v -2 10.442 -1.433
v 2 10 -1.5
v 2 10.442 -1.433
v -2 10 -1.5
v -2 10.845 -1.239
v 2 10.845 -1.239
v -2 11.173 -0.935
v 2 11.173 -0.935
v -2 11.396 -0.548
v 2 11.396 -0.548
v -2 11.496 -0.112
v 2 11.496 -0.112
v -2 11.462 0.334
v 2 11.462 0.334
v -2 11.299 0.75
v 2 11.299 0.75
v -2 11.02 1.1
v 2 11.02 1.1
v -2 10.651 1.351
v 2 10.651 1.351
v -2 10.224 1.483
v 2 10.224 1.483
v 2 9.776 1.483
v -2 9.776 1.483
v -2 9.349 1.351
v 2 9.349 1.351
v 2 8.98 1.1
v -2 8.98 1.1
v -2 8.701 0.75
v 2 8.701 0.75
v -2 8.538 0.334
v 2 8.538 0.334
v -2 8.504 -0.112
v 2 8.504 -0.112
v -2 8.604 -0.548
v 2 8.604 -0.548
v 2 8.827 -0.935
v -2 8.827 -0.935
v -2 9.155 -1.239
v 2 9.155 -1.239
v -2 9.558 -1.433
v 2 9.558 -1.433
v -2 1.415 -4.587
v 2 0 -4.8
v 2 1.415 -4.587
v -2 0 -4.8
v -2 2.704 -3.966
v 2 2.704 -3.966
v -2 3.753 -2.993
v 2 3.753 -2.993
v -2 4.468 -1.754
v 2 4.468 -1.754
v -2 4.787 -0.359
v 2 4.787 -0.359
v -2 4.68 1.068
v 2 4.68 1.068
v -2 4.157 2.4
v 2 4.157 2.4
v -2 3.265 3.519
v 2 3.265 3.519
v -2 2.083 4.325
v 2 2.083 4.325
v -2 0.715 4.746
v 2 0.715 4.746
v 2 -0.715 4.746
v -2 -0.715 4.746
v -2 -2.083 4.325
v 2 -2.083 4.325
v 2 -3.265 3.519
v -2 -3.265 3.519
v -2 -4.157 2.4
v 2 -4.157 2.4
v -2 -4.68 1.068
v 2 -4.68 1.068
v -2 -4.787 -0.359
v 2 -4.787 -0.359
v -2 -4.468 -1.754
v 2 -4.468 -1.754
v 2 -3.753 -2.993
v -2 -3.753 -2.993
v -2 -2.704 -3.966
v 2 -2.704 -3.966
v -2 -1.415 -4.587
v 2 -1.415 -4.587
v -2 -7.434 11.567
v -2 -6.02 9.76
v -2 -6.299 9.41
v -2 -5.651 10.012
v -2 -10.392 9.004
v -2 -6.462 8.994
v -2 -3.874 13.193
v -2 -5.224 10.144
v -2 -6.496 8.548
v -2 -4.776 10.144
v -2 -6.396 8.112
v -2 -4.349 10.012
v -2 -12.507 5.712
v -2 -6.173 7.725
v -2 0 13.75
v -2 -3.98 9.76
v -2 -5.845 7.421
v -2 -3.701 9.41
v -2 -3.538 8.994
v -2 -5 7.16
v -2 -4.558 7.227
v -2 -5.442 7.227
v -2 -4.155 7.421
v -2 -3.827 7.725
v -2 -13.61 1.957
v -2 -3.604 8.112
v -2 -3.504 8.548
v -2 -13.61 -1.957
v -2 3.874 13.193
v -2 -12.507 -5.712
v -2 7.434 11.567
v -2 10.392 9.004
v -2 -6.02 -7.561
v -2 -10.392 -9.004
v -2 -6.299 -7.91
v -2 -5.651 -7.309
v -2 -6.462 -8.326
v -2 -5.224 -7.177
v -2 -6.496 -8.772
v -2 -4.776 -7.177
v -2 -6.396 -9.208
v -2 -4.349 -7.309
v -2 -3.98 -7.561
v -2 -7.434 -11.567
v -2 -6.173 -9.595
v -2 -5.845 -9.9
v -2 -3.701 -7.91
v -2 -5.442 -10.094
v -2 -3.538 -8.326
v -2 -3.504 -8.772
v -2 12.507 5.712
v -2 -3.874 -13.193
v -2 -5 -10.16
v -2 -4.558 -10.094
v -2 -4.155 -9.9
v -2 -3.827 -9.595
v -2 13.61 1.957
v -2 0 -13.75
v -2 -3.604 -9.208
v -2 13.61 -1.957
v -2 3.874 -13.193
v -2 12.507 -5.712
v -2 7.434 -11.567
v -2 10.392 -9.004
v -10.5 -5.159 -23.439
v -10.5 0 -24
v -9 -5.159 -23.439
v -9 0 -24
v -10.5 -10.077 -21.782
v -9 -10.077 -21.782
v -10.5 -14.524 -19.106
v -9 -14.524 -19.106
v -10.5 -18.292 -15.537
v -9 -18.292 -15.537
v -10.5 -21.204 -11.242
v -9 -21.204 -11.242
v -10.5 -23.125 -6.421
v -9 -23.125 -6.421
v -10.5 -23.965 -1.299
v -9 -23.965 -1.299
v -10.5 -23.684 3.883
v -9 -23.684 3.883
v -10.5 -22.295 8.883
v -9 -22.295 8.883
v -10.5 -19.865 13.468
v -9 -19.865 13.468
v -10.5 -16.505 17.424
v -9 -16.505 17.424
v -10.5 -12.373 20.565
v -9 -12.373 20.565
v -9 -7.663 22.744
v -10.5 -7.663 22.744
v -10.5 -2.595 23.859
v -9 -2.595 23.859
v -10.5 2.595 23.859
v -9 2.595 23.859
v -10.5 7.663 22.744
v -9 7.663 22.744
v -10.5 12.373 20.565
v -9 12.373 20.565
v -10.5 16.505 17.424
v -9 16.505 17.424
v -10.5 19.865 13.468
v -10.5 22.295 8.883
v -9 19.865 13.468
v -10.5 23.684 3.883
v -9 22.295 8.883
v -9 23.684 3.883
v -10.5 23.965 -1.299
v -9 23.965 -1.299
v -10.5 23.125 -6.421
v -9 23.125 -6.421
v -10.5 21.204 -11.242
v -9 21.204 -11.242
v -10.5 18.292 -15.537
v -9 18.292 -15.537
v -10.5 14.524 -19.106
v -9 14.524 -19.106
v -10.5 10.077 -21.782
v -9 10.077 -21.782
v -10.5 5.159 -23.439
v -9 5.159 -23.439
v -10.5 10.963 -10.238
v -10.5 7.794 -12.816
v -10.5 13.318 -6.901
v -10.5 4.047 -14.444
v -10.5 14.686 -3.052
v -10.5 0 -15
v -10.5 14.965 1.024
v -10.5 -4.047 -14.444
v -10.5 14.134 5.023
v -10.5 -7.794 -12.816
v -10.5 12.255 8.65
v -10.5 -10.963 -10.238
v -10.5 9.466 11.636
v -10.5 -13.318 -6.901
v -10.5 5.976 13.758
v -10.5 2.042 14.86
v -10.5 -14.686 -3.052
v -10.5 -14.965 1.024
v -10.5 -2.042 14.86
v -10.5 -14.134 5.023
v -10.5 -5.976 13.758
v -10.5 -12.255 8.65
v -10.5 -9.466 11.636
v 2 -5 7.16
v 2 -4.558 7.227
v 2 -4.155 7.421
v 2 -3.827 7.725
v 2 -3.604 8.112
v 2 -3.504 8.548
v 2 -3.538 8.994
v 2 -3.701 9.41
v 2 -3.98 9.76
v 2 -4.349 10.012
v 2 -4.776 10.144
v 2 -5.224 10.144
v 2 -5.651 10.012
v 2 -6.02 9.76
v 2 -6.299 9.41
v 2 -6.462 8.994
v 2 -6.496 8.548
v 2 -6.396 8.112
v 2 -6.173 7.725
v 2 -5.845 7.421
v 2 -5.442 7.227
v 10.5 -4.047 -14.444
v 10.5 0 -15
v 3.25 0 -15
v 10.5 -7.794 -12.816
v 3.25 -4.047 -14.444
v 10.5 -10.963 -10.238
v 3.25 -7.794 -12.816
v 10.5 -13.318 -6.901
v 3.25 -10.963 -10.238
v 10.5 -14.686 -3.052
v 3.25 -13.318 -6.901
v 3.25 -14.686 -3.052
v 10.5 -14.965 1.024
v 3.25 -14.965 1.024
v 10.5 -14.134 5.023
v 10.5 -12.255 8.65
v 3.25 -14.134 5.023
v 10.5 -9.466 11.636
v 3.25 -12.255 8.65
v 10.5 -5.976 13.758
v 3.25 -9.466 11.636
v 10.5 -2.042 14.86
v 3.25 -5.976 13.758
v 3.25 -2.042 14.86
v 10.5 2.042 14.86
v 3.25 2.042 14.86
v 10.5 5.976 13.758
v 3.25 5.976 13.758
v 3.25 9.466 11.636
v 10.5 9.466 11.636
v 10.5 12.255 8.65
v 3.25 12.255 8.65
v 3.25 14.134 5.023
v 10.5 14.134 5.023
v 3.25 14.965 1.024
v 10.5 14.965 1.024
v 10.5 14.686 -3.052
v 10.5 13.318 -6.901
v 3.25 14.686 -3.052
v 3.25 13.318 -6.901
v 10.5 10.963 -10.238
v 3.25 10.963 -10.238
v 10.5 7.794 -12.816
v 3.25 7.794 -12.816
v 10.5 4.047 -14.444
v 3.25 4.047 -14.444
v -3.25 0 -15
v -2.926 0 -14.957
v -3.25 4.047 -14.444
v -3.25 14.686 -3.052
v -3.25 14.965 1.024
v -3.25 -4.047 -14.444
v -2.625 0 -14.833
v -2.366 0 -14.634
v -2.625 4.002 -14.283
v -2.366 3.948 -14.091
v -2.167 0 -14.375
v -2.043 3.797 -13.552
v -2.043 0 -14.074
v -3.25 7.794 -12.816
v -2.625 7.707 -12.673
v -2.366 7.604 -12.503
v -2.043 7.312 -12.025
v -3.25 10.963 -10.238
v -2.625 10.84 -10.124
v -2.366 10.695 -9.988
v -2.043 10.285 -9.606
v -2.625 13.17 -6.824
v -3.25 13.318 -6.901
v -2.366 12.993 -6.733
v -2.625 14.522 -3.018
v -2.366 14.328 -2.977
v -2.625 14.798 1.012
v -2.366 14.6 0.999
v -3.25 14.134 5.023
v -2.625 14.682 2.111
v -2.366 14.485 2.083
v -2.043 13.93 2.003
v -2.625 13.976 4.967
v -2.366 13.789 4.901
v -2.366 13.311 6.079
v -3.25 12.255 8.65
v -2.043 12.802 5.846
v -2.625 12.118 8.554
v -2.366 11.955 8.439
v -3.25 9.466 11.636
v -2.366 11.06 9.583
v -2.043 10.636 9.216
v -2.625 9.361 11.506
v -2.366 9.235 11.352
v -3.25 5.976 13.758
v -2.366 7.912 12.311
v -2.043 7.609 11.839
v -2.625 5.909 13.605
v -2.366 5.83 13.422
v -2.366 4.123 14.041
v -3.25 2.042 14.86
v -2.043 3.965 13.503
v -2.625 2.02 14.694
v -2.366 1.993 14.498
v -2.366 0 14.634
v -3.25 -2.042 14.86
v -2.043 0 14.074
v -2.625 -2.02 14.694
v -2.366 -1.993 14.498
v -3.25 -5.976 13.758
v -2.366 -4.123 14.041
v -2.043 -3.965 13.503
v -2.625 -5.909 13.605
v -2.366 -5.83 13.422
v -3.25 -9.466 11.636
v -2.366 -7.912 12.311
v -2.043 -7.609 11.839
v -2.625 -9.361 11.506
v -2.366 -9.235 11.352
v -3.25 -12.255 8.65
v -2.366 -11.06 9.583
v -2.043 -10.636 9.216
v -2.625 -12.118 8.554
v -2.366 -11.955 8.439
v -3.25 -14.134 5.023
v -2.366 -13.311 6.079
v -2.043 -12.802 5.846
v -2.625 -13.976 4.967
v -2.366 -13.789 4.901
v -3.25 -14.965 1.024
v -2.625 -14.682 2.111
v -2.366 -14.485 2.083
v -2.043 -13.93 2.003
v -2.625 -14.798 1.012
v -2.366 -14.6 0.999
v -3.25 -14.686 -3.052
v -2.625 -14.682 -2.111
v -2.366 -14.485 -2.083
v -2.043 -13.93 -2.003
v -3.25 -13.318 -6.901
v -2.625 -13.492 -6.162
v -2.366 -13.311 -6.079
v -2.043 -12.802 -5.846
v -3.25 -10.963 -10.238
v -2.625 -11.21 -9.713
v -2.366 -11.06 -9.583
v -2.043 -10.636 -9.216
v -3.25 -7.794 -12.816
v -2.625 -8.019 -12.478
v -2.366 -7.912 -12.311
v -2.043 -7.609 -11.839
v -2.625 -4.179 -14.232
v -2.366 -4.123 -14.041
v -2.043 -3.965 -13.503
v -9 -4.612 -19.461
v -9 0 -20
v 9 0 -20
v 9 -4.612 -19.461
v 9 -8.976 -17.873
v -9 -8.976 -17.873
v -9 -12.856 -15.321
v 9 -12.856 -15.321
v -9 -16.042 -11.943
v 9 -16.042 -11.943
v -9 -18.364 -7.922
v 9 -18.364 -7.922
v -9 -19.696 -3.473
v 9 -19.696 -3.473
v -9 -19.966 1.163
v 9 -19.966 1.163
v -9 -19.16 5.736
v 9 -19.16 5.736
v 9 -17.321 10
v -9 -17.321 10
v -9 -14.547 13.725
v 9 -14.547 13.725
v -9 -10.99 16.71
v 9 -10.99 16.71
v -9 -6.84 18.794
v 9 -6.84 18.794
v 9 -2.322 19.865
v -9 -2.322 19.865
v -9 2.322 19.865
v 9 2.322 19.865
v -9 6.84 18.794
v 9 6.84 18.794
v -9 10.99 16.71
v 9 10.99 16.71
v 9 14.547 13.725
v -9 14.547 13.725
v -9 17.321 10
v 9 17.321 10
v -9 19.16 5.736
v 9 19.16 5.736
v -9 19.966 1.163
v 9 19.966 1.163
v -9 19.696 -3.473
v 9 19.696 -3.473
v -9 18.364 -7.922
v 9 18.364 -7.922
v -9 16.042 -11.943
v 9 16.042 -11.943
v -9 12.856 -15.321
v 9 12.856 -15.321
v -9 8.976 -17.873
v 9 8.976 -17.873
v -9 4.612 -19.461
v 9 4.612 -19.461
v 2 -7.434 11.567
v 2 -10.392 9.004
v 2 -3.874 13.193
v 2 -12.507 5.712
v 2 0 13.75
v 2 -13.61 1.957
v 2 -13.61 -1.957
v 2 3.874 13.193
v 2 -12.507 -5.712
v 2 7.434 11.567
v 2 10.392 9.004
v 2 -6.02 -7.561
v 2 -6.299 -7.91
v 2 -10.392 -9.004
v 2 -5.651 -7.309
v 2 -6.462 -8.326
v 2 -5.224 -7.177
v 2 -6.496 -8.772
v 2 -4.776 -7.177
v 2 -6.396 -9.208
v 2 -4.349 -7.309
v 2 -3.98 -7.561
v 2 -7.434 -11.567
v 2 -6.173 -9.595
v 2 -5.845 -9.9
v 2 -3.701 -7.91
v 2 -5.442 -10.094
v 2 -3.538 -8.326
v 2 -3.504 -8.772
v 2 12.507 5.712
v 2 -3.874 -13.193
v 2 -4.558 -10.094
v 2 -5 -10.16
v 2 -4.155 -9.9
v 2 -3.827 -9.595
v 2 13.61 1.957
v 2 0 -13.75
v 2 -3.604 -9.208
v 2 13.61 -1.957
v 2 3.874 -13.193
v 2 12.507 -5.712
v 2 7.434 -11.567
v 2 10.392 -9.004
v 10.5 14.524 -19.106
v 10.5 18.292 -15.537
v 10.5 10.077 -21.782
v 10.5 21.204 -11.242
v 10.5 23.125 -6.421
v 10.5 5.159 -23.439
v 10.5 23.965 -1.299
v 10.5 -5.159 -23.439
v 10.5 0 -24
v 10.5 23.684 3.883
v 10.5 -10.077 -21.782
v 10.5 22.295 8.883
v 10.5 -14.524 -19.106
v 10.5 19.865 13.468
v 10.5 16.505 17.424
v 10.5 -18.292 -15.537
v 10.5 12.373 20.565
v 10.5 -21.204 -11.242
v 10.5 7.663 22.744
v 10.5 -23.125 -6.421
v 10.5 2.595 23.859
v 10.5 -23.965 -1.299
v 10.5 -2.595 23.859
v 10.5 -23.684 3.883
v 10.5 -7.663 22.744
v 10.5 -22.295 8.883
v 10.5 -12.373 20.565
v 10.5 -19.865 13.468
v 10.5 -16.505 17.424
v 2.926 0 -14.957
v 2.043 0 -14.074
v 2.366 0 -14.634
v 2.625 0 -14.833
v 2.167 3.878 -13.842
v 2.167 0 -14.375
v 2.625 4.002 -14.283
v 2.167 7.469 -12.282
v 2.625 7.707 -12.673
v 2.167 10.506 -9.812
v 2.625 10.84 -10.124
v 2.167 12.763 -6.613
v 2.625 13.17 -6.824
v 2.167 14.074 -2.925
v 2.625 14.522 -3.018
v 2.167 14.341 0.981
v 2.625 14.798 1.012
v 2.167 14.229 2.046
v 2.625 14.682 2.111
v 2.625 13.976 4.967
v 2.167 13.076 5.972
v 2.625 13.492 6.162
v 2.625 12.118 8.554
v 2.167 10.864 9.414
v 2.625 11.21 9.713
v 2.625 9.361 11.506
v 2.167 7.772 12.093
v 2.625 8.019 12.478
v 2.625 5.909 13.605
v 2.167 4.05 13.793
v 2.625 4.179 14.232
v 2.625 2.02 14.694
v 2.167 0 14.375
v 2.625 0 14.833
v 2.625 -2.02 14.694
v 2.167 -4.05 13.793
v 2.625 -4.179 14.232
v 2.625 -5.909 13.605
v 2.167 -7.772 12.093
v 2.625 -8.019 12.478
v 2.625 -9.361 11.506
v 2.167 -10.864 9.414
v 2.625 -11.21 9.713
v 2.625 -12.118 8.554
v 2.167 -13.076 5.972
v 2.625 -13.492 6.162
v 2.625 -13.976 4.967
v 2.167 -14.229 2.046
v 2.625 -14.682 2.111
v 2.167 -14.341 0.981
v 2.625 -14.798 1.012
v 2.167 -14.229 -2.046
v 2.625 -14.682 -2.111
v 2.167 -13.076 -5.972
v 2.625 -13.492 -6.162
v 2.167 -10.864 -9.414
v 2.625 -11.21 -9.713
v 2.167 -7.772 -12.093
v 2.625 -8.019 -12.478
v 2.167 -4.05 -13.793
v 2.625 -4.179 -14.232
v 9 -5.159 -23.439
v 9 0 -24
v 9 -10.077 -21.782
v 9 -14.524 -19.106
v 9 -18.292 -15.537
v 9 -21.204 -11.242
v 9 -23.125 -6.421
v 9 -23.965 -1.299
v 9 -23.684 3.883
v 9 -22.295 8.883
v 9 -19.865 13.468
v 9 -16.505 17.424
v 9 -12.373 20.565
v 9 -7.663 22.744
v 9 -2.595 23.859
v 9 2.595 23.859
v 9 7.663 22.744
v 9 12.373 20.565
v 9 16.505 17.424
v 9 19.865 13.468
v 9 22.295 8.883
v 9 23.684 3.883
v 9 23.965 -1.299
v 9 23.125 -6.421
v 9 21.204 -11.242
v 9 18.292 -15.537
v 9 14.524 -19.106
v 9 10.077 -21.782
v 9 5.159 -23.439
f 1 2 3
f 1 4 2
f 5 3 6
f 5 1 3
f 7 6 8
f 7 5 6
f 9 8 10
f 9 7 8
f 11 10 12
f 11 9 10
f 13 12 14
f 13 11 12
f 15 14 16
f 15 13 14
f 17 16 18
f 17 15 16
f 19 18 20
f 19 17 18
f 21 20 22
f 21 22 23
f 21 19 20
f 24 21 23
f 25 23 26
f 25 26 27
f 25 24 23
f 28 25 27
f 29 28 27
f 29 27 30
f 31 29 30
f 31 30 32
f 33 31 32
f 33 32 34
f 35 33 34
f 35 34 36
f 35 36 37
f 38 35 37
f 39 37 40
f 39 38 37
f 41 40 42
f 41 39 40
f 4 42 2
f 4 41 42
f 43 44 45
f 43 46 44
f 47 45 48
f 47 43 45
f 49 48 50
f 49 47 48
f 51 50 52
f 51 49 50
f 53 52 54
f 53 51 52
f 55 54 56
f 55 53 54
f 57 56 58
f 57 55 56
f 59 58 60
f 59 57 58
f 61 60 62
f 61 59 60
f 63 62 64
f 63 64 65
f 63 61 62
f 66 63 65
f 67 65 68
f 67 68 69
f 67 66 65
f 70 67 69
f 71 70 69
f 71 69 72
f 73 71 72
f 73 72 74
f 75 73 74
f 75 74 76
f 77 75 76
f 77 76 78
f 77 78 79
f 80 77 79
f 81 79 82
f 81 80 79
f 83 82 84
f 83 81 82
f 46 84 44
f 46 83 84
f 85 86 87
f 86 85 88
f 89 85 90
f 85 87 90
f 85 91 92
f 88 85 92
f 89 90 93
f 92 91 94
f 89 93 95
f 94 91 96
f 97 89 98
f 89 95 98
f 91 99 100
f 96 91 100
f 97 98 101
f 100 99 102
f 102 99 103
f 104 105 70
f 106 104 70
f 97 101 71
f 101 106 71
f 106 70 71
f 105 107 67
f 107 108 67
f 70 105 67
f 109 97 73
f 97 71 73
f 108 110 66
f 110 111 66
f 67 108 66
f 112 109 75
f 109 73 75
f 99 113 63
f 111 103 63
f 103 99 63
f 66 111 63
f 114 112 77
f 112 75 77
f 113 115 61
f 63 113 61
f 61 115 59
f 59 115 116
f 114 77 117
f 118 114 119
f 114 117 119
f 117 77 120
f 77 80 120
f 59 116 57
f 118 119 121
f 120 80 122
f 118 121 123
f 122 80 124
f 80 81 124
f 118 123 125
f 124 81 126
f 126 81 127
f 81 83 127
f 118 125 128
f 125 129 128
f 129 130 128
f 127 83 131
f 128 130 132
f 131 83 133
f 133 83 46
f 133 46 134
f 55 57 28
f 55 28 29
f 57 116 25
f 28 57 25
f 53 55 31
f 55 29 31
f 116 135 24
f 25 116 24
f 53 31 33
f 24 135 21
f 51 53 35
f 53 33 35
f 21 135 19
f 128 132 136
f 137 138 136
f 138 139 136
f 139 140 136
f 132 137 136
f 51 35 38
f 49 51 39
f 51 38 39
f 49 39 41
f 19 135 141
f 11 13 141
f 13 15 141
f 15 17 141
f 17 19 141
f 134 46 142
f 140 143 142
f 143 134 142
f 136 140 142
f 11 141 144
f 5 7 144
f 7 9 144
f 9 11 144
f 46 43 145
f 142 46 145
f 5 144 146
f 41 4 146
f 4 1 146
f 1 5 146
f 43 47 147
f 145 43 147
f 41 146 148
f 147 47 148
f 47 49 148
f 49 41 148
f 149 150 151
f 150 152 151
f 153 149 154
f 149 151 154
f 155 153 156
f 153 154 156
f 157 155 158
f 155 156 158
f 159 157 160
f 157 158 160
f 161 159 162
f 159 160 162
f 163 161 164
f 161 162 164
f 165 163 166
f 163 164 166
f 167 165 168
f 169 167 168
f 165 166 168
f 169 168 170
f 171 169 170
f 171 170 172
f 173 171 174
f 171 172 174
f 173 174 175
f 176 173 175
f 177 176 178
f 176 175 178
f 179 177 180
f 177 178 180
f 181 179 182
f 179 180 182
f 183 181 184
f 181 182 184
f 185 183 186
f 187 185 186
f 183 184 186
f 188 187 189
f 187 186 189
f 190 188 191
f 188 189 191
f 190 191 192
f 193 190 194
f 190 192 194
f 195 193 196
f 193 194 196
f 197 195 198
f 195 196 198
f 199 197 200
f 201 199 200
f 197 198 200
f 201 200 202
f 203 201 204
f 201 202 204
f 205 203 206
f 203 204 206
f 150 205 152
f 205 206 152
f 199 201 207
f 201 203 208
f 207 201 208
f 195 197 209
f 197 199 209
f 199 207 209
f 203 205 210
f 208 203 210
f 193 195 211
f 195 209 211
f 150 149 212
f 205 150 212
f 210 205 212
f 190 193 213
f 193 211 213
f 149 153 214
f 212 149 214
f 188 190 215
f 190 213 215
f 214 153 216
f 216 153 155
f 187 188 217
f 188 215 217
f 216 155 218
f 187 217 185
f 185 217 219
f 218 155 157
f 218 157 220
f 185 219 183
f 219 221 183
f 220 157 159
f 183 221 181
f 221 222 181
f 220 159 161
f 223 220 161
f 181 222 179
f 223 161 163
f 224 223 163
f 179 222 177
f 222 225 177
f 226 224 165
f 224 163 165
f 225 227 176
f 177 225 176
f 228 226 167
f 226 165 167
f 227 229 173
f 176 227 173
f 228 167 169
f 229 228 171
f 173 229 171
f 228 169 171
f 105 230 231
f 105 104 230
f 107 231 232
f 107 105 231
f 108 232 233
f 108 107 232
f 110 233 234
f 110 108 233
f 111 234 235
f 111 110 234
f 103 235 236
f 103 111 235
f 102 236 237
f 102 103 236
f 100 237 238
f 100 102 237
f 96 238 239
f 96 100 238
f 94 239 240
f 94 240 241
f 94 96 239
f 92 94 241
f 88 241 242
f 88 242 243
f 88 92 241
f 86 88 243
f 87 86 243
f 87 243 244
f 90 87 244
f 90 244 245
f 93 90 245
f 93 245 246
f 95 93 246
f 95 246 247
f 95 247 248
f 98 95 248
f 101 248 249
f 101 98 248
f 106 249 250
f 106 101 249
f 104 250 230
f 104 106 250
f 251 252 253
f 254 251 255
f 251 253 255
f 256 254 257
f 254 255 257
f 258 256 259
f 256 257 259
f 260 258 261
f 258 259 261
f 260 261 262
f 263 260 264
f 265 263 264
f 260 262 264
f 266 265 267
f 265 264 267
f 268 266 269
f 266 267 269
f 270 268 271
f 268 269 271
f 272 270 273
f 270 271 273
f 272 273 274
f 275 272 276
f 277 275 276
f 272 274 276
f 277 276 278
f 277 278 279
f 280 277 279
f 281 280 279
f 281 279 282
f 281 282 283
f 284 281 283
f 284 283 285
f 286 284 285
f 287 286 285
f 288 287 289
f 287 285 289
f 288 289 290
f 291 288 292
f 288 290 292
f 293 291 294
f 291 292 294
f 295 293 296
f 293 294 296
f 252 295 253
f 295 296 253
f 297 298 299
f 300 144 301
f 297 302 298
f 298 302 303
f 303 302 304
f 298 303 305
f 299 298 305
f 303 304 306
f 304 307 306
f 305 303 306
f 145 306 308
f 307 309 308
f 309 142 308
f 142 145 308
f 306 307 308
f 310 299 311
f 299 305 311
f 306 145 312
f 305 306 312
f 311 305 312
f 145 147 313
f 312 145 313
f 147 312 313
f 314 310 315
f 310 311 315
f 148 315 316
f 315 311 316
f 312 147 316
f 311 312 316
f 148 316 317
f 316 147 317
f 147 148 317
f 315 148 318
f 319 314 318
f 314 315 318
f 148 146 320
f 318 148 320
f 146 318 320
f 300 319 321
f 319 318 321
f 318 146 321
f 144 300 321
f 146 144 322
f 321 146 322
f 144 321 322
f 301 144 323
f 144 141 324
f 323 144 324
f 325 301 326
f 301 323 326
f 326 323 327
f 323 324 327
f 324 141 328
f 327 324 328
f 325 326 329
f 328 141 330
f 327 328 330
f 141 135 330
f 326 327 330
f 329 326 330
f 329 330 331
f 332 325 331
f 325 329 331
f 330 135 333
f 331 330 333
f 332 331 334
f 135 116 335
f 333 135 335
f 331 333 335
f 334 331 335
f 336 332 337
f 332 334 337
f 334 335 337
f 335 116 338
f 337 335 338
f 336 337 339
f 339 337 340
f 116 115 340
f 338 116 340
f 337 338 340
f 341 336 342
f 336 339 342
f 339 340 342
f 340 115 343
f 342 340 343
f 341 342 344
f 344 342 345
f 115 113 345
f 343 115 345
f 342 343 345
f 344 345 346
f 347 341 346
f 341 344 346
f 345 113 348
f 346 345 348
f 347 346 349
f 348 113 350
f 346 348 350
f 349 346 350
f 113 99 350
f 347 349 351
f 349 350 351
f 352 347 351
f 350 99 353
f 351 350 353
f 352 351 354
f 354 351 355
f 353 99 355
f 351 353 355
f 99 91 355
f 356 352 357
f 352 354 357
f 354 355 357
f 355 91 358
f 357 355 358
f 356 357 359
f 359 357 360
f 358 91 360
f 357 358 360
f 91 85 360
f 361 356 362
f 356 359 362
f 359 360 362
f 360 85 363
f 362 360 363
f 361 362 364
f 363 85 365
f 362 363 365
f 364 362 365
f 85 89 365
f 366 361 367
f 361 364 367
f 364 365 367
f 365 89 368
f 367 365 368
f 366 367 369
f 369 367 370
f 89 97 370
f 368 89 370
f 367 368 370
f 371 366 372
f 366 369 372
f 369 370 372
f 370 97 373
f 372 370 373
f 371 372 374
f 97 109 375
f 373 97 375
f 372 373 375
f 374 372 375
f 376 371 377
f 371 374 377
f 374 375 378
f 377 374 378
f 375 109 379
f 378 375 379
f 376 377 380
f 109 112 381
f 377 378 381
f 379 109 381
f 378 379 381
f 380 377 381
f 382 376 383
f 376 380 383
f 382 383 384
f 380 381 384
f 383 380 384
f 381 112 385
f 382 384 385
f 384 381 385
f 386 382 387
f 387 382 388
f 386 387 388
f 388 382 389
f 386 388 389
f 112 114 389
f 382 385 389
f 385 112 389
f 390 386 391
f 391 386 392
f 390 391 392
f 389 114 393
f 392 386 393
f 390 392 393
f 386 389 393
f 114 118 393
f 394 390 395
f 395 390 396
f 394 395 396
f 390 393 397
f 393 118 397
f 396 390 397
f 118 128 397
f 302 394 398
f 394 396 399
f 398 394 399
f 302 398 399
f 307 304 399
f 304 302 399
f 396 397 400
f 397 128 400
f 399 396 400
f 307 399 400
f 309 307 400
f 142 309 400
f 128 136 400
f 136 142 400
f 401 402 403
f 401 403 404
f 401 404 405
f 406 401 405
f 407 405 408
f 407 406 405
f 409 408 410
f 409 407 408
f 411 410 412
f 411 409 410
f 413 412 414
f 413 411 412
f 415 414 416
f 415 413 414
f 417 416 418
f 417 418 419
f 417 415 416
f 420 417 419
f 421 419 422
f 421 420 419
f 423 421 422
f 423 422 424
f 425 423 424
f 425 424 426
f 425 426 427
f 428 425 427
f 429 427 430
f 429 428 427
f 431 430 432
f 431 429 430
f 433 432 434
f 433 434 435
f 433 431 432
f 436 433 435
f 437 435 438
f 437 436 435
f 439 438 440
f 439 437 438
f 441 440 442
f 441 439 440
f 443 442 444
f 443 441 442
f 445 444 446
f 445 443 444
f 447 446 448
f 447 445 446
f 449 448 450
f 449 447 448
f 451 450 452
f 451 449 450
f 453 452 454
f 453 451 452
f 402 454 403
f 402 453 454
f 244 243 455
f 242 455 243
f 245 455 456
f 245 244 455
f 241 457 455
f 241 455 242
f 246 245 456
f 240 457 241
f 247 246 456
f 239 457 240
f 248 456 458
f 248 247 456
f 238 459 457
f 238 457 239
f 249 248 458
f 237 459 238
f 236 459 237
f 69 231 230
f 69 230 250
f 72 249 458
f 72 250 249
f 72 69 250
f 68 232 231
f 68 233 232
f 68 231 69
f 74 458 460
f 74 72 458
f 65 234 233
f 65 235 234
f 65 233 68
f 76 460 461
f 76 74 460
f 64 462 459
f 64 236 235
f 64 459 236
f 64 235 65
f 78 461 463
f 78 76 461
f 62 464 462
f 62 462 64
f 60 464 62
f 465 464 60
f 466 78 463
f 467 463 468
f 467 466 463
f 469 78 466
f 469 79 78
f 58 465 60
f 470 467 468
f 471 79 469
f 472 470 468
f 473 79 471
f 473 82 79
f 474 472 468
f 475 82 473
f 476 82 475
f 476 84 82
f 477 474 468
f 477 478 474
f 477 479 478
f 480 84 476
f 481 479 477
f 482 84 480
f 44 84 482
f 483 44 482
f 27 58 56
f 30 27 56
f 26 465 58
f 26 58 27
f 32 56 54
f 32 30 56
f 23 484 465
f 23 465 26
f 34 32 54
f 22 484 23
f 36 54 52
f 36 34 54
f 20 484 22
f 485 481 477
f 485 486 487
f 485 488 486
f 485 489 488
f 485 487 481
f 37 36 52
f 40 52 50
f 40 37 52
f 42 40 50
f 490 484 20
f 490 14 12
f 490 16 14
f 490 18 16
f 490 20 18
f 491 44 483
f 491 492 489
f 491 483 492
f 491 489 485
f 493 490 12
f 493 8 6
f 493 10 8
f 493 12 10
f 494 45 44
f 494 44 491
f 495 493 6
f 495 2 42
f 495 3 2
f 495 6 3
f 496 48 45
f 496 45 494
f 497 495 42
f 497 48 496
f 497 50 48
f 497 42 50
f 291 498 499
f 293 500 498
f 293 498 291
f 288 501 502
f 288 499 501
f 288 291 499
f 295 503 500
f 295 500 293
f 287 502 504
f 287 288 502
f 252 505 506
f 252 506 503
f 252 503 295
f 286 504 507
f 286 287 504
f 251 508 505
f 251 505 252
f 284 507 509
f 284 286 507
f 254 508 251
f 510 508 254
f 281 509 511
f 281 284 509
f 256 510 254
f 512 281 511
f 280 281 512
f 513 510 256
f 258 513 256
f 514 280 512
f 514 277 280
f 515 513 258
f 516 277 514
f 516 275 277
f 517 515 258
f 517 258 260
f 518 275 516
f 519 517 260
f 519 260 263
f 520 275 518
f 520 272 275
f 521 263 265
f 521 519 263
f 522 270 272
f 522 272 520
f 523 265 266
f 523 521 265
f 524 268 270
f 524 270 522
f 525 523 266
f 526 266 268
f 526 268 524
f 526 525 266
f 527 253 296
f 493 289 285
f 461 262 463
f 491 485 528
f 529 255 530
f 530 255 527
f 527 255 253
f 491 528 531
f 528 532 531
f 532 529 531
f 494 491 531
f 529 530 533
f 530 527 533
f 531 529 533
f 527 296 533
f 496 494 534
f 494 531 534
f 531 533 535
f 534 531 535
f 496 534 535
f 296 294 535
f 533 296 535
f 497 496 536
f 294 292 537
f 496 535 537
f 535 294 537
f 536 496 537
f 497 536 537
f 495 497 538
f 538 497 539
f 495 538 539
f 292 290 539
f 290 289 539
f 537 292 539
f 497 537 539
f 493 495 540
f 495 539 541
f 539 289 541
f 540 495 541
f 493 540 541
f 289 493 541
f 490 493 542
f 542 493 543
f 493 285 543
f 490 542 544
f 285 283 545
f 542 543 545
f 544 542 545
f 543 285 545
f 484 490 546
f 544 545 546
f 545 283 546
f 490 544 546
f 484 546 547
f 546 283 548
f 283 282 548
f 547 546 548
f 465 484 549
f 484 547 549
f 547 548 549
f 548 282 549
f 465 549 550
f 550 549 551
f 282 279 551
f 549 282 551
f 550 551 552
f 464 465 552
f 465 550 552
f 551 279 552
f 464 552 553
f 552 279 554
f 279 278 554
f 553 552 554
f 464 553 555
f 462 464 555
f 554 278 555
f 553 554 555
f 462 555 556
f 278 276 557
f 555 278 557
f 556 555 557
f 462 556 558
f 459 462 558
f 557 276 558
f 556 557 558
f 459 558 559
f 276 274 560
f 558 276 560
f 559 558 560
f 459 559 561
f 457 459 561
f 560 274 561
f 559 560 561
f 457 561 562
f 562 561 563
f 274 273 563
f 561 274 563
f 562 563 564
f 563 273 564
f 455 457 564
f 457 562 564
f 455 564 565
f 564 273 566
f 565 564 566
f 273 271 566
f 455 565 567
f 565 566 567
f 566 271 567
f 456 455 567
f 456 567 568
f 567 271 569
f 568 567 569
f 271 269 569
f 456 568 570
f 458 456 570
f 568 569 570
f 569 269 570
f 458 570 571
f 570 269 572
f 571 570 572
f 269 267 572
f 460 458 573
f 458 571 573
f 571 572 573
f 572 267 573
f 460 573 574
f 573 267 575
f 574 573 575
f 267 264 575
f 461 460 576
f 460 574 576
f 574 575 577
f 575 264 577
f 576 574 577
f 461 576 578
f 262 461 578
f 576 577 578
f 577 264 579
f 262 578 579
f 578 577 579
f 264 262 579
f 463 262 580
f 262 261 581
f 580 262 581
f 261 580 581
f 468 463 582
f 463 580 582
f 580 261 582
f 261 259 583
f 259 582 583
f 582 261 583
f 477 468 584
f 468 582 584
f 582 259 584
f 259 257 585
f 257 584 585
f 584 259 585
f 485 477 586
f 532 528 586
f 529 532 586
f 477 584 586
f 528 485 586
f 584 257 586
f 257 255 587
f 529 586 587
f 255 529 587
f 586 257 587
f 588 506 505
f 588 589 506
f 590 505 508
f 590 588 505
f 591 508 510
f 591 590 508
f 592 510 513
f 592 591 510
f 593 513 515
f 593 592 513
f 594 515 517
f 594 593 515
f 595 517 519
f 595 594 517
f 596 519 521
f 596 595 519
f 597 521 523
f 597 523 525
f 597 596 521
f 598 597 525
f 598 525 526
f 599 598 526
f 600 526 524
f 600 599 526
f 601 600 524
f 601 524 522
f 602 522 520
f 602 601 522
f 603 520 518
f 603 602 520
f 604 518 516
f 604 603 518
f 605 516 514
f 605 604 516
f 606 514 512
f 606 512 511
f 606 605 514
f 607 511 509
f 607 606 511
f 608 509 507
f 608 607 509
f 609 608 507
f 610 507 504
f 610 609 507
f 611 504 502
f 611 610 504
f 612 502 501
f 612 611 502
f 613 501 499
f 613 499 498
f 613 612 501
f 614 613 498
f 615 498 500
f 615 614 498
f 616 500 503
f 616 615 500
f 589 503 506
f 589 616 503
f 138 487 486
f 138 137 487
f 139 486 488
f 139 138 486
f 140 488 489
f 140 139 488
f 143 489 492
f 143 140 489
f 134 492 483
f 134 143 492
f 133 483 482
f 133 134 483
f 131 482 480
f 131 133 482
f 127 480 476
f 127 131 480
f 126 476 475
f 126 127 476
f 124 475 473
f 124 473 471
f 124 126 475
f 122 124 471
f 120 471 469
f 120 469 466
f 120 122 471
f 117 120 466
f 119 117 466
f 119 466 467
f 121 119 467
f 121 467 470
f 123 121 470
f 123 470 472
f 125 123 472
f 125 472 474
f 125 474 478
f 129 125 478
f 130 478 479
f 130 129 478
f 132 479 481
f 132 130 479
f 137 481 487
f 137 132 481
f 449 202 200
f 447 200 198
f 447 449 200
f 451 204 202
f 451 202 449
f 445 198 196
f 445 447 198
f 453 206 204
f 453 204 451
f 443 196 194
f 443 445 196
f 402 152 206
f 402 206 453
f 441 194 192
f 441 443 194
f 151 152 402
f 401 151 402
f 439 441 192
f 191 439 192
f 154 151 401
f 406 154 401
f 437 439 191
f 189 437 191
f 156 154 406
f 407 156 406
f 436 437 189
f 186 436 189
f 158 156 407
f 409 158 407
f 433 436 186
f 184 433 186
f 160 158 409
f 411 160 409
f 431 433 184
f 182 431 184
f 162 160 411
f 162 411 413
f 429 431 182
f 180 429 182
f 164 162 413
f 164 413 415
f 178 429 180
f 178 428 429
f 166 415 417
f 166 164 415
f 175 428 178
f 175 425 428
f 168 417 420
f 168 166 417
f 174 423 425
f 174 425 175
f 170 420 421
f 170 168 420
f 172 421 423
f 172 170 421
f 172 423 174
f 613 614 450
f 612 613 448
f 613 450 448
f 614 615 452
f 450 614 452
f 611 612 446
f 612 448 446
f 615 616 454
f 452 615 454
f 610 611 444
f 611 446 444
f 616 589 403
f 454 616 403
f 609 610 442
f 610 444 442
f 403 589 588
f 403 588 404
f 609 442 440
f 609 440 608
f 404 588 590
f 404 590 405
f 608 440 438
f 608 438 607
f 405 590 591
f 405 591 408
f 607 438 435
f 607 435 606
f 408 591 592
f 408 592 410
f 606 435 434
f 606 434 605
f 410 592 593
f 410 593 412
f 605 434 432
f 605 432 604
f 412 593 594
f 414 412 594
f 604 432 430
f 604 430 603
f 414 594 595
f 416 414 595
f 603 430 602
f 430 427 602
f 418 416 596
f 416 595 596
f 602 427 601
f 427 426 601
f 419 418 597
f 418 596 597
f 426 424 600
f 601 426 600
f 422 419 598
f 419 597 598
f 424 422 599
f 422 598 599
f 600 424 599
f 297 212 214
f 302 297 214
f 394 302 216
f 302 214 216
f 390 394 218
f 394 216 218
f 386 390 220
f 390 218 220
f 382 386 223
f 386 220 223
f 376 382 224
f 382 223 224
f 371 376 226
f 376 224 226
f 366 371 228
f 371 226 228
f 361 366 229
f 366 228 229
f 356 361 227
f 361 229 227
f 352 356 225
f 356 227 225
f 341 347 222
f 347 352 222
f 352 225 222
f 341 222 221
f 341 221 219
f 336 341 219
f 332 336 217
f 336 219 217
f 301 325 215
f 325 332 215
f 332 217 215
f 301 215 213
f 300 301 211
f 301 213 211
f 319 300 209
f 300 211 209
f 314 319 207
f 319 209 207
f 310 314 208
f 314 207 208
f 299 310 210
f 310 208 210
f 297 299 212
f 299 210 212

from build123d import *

# Parameters (mm, degrees)
SKETCH1_R           = 15
SKETCH1_R_2         = 4.8
SKETCH1_R_3         = 1.5
BOSS_EXTRUDE1_DEPTH = 2
SKETCH7_W           = 1.5
SKETCH7_H           = 4
FILLET1_R           = 1.25


with BuildPart() as part:
    # Sketch1 → Boss-Extrude1 (new, symmetric)
    with BuildSketch(Plane.YZ):
        with Locations(Location((0, 0, 0), (0, 0, 270))):
            Circle(SKETCH1_R)
        with Locations(Location((0, 0, 0), (0, 0, 270))):
            Circle(SKETCH1_R_2, mode=Mode.SUBTRACT)
        with Locations(Location((10, 0, 0), (0, 0, 270))):
            Circle(SKETCH1_R_3, mode=Mode.SUBTRACT)
        with Locations(Location((-5, -8.660254038, 0), (0, 0, 270))):
            Circle(SKETCH1_R_3, mode=Mode.SUBTRACT)
        with Locations(Location((-5, 8.660254038, 0), (0, 0, 270))):
            Circle(SKETCH1_R_3, mode=Mode.SUBTRACT)
    extrude(amount=BOSS_EXTRUDE1_DEPTH, both=True)

    # Sketch2 → Revolve1 (revolve)
    with BuildSketch(Plane(origin=(0, 0, 0), x_dir=(-1, 0, 0), z_dir=(0, 1, 0)), mode=Mode.PRIVATE) as revolve1_sk:
        Polygon((-2, 15), (-10.5, 15), (-10.5, 20), (10.5, 20), (10.5, 15), (2, 15), align=None)
    revolve(revolve1_sk.sketch.rotate(Axis((2, 0, 0), (-1, 0, 0)), 180), axis=Axis((2, 0, 0), (-1, 0, 0)))

    # Sketch7 → Revolve2 (revolve)
    with BuildSketch(Plane(origin=(0, 0, 0), x_dir=(-1, 0, 0), z_dir=(0, 1, 0)), mode=Mode.PRIVATE) as revolve2_sk:
        with Locations((-9.75, 22)):
            Rectangle(SKETCH7_W, SKETCH7_H)
    revolve2 = revolve(revolve2_sk.sketch.rotate(Axis((2, 0, 0), (-1, 0, 0)), 180), axis=Axis((2, 0, 0), (-1, 0, 0)))

    # Mirror1: Revolve2 across plane
    add(revolve2.mirror(Plane(origin=(0, 0, 0), x_dir=(0, 0, 1), z_dir=(1, 0, 0))))

    # Fillet1
    fillet1_edges = [part.edges().sort_by_distance(p)[0] for p in [
        (-2, 0, 15),
        (2, 0, 15),
    ]]
    fillet(fillet1_edges, radius=FILLET1_R)


solid = part.part
